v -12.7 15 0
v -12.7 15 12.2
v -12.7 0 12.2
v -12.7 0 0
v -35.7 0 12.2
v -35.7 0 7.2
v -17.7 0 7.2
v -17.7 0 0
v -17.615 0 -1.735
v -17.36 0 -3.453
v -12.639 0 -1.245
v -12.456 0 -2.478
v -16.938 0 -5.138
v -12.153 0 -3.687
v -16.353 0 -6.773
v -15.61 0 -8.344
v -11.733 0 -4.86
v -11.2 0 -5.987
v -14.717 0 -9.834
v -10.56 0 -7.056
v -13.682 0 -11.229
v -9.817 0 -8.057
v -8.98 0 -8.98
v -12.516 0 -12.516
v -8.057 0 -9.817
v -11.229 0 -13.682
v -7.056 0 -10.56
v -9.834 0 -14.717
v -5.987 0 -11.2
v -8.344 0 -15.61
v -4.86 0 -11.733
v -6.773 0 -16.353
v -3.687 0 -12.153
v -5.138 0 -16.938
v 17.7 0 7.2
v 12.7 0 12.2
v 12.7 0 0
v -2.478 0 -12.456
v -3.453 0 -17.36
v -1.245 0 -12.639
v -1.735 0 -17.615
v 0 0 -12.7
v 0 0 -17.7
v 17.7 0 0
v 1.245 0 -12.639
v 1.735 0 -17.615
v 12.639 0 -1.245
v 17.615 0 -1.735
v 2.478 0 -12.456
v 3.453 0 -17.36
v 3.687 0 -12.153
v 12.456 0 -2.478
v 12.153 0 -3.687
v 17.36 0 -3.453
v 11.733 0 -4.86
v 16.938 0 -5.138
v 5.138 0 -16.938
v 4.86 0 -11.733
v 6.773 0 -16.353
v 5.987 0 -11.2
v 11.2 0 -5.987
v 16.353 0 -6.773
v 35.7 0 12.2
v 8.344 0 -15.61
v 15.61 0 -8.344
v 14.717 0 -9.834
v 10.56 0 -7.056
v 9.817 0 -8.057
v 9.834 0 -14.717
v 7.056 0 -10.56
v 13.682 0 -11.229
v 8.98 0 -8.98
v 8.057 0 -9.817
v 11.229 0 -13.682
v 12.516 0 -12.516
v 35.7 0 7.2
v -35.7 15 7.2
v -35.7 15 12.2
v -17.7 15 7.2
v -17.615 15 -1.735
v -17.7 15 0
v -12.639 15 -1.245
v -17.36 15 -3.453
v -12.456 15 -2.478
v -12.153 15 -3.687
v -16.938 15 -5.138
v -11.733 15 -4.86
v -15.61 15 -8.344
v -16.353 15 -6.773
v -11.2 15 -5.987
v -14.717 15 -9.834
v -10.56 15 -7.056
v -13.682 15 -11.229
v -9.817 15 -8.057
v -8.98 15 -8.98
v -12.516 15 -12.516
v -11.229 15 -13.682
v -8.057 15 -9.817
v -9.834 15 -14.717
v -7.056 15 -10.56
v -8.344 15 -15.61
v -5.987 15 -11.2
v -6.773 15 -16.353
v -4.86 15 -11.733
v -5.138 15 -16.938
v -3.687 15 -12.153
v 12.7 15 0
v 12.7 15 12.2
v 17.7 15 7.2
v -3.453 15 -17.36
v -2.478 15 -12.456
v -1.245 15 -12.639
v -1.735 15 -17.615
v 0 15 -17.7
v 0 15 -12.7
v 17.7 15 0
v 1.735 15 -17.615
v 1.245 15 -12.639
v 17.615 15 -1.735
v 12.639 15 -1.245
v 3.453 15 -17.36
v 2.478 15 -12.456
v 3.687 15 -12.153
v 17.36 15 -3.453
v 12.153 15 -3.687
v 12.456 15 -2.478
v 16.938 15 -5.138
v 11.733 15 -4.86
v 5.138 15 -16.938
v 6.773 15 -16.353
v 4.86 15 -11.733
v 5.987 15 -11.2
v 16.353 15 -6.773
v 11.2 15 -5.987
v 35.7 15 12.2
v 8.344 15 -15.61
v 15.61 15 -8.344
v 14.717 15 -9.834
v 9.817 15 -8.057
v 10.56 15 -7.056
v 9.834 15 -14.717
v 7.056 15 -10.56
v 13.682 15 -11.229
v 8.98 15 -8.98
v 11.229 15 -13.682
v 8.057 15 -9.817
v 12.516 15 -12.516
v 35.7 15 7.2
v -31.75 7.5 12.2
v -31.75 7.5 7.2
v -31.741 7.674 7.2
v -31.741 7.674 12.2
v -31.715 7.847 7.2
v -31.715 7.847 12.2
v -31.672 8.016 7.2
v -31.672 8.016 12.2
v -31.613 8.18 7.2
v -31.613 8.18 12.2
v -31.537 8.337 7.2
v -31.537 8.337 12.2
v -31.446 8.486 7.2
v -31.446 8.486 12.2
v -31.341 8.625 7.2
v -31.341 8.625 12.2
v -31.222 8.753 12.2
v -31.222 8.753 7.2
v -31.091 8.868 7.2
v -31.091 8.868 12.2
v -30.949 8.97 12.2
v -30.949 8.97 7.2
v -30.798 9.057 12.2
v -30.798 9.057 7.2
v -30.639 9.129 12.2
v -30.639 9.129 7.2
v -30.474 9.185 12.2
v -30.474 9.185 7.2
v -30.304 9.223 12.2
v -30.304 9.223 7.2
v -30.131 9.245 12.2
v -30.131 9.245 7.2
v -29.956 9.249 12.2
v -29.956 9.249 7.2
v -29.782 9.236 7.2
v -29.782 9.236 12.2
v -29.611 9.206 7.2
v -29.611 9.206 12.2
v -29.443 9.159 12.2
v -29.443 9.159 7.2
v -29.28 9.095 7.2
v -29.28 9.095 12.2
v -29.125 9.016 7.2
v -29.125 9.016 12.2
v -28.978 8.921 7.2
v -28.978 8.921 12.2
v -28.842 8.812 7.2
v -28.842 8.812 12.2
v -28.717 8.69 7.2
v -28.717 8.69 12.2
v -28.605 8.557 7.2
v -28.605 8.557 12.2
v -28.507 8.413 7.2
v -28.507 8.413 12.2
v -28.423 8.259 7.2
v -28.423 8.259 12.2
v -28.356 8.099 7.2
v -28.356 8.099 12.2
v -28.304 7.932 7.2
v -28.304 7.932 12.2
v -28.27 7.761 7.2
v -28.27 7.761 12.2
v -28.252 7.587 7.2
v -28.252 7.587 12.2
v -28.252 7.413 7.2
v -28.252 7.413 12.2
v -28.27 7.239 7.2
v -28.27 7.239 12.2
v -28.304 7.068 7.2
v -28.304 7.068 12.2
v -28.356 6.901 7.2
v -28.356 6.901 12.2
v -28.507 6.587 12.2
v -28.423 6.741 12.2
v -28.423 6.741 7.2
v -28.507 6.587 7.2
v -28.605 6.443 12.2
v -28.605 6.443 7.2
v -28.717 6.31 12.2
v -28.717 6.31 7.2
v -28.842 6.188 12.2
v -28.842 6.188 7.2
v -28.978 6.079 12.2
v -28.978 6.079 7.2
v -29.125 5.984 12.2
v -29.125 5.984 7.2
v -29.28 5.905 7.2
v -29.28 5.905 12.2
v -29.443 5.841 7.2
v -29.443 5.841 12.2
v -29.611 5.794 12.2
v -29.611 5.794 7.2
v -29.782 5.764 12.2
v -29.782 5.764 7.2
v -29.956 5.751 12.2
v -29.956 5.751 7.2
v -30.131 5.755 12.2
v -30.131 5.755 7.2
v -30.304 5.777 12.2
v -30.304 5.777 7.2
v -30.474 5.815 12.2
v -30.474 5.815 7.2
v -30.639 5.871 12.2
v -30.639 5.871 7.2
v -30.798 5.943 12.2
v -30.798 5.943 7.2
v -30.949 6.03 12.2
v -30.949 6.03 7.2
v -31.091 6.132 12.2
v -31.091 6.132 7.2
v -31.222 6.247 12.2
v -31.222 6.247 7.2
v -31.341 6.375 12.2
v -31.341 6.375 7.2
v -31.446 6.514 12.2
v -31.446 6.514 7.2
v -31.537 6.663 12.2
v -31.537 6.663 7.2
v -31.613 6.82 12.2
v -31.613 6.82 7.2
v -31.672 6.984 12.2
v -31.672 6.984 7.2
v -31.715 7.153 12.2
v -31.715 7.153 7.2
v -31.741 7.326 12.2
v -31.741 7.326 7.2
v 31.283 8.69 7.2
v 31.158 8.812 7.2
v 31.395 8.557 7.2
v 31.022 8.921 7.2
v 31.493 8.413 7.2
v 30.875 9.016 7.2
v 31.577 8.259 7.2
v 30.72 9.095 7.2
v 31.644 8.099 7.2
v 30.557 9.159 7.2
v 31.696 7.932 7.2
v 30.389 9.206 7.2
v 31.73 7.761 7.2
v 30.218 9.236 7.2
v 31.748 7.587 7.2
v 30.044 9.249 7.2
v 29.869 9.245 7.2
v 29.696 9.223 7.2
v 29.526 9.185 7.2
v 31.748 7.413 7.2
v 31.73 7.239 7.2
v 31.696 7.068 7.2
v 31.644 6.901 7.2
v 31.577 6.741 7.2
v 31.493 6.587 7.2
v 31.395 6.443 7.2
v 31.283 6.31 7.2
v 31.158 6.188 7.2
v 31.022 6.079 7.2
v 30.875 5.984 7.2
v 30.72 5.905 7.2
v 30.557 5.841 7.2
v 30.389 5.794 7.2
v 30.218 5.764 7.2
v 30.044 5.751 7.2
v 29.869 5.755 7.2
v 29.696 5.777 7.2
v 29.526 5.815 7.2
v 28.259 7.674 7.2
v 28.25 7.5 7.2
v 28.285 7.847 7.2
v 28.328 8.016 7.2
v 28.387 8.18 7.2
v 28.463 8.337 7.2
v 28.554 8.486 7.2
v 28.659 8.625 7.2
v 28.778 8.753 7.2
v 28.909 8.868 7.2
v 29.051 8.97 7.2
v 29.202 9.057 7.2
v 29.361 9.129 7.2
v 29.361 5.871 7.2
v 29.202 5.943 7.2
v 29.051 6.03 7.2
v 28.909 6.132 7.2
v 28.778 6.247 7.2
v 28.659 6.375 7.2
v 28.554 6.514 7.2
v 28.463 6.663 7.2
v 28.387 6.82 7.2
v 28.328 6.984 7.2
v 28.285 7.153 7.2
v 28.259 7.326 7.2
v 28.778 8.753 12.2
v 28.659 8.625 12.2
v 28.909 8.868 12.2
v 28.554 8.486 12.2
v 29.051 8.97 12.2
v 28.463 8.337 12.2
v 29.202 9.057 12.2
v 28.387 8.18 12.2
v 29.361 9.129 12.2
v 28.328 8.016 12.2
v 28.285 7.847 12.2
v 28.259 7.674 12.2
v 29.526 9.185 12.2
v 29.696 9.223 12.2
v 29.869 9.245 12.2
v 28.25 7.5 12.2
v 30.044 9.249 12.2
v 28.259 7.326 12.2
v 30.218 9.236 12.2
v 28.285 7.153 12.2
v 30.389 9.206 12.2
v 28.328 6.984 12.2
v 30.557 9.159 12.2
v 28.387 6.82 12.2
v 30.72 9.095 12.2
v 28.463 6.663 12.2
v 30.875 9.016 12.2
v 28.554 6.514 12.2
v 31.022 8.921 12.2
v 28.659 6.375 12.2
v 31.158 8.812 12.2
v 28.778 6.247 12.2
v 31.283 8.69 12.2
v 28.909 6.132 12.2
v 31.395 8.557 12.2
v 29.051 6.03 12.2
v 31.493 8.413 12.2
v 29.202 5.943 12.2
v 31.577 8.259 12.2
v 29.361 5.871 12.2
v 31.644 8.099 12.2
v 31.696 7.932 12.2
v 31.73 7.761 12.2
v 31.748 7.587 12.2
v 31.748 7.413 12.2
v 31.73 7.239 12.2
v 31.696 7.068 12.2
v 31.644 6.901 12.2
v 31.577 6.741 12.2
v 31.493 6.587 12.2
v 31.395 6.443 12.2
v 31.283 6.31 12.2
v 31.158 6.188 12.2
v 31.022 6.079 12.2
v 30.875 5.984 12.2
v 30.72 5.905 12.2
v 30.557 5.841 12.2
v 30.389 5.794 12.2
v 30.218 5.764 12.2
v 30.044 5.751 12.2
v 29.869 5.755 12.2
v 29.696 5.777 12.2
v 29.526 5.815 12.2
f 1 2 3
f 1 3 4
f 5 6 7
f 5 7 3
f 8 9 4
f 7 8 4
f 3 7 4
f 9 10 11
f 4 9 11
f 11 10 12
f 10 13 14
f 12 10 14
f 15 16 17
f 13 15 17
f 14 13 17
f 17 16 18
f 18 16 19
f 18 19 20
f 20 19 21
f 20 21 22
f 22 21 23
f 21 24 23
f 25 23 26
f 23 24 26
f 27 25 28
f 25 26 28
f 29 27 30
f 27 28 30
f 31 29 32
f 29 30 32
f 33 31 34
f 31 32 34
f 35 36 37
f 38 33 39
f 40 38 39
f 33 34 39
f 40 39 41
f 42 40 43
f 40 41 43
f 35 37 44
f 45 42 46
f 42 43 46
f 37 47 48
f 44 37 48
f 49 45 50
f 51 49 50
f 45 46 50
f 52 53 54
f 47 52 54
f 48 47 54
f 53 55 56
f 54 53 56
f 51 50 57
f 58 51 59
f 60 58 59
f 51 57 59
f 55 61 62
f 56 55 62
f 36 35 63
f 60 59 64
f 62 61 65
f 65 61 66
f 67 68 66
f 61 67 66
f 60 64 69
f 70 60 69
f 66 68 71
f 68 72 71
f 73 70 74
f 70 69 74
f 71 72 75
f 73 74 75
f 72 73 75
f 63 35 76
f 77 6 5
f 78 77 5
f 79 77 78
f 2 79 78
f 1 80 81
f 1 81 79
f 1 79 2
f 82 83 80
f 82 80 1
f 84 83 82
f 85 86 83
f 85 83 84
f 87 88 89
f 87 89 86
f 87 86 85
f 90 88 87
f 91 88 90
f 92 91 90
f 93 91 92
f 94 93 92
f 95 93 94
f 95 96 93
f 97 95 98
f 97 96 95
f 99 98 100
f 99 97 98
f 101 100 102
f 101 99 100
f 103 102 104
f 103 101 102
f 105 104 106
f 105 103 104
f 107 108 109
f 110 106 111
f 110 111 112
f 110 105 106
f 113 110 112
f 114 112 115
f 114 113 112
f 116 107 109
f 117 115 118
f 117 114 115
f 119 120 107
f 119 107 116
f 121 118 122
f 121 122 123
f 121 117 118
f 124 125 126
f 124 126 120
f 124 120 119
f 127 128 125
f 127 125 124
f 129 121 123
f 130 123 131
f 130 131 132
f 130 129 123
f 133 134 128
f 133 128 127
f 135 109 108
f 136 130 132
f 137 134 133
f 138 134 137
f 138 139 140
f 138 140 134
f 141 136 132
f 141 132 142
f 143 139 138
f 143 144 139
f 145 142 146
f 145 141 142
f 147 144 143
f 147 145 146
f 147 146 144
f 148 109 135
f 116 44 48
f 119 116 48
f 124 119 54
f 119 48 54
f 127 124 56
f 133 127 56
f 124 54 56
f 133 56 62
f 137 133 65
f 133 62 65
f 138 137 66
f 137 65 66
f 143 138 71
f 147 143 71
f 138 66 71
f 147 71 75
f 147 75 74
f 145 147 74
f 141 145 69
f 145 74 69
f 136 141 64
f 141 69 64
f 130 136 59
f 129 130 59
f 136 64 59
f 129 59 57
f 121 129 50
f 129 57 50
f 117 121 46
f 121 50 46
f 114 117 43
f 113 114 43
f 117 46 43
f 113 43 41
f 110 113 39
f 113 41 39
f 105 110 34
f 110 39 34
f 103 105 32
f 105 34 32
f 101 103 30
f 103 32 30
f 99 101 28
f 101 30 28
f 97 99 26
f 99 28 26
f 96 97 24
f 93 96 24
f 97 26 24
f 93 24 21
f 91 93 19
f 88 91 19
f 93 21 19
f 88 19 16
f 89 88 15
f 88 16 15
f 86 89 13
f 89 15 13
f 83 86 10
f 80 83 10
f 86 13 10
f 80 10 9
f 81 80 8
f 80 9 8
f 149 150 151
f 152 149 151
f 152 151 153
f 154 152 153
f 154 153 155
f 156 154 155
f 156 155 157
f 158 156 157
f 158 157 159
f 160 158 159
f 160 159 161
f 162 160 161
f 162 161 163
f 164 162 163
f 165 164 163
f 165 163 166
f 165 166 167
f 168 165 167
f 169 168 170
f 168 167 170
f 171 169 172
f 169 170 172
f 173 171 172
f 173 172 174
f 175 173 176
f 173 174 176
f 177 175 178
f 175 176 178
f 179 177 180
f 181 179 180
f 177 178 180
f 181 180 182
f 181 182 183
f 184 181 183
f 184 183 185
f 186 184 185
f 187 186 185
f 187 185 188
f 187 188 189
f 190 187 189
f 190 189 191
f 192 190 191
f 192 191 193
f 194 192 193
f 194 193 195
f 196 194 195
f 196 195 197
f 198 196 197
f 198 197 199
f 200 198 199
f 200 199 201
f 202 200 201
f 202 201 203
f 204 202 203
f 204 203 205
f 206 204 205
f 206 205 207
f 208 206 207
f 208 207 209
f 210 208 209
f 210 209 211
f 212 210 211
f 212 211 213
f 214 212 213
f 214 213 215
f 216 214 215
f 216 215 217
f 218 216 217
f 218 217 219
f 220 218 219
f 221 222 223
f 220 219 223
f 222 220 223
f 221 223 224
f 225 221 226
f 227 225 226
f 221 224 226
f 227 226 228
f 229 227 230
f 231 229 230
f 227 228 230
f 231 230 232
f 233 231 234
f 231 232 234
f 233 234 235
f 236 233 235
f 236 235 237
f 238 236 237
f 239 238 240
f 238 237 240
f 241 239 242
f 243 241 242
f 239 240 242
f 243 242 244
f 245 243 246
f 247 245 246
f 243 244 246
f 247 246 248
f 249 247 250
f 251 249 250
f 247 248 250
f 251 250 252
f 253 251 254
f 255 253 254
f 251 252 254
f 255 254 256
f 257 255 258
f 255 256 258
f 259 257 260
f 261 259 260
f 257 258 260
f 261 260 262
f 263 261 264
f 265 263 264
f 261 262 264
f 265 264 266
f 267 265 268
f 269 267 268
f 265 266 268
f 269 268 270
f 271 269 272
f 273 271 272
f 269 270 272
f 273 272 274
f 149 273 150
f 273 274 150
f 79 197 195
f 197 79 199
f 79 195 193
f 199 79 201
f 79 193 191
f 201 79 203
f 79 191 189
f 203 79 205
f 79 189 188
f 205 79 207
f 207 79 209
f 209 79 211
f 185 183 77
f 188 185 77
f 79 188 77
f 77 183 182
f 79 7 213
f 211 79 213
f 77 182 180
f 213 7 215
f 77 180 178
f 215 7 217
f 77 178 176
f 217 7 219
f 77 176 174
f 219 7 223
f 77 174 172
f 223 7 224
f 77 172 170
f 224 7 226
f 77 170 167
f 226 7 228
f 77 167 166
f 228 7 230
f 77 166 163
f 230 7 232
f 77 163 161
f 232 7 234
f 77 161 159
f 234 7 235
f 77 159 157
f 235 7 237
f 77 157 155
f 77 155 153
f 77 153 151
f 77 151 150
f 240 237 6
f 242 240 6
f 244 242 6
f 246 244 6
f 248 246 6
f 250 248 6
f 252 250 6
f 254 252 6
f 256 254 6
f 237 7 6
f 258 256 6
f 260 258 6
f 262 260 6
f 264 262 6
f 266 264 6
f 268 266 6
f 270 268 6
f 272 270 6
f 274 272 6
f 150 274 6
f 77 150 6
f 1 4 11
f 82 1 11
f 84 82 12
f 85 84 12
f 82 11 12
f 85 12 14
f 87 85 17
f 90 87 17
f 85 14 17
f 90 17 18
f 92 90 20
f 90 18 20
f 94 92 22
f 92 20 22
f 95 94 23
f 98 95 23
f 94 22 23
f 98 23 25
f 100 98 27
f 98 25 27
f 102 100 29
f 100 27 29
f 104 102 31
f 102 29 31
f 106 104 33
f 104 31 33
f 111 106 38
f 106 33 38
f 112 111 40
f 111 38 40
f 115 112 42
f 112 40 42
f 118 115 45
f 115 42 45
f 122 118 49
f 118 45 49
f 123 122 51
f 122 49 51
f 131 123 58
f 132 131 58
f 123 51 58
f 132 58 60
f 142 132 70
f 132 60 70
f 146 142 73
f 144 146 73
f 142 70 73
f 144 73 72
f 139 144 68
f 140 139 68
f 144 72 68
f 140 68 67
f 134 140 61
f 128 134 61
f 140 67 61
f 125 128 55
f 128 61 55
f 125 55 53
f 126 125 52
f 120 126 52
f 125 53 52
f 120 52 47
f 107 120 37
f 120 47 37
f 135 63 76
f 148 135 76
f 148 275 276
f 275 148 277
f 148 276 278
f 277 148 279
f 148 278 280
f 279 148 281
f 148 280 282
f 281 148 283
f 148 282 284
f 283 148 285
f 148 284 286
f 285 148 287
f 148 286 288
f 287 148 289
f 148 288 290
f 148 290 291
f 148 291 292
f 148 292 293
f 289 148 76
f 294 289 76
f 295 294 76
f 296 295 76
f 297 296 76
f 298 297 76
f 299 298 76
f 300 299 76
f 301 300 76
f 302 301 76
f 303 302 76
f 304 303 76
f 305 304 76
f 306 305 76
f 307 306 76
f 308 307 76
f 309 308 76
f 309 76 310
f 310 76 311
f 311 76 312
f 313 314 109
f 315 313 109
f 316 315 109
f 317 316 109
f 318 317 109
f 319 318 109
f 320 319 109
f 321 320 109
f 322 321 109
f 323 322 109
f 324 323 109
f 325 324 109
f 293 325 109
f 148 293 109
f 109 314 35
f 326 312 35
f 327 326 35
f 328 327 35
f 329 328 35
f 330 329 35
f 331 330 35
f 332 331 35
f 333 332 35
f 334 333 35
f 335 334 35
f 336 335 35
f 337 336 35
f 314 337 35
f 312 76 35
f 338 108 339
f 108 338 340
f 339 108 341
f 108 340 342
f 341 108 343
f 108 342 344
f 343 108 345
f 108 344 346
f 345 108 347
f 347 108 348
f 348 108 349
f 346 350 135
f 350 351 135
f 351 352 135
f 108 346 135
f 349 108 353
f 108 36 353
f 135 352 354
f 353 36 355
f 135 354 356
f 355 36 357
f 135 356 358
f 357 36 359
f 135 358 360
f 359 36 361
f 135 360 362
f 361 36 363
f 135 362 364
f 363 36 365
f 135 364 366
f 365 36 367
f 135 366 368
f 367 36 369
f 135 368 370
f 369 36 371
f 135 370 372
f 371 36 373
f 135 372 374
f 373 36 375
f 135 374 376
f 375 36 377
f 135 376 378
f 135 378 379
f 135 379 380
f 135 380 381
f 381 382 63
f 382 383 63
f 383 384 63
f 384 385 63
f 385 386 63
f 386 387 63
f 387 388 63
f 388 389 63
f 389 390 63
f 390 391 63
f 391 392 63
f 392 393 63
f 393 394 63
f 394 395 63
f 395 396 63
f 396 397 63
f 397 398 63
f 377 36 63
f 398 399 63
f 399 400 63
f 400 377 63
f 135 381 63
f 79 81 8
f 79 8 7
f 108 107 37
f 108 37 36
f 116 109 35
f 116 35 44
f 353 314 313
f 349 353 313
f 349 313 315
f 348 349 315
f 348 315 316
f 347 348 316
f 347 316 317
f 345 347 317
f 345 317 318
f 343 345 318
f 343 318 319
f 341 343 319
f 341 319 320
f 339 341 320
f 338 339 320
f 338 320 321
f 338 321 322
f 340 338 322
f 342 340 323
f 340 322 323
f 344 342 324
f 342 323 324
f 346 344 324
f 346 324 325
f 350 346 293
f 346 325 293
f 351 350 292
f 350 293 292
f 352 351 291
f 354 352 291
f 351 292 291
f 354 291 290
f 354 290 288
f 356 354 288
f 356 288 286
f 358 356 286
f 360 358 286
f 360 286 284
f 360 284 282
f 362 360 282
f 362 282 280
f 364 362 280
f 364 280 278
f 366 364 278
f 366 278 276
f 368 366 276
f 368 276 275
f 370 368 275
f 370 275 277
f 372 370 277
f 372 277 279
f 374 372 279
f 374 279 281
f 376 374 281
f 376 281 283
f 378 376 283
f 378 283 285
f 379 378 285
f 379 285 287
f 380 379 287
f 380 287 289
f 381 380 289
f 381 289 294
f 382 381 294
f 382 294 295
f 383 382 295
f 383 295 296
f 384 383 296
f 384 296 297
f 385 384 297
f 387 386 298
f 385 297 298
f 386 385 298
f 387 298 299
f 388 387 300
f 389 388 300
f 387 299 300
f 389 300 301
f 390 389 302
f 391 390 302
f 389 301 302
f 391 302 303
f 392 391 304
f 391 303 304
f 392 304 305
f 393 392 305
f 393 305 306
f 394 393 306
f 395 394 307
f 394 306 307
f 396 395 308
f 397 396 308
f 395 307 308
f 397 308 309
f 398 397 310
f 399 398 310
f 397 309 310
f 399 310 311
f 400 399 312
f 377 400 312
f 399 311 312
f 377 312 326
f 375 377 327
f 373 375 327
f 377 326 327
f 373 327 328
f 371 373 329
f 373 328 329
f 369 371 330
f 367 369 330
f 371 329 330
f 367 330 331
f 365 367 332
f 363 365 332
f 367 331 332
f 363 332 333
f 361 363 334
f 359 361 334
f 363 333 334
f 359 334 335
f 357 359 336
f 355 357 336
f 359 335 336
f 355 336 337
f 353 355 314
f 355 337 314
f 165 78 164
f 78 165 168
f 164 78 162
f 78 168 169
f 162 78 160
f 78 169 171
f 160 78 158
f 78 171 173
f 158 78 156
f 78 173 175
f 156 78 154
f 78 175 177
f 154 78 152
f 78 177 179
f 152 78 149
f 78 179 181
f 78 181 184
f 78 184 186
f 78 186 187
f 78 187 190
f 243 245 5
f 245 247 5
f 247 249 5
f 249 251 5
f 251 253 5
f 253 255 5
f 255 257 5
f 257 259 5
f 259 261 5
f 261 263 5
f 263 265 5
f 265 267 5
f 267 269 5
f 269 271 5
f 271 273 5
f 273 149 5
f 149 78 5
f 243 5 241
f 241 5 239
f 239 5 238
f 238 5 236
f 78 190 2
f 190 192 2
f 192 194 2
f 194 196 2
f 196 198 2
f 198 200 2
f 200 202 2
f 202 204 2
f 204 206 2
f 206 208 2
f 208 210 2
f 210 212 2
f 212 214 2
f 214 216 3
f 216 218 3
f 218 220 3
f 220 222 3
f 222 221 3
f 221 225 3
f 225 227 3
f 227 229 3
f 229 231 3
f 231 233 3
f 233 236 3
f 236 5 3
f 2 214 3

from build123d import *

# Parameters (mm, degrees)
BOSS_EXTRUDE1_DEPTH = 15
SKETCH2_R           = 1.75
CUT_EXTRUDE1_DEPTH  = 6


with BuildPart() as part:
    # Sketch1 → Boss-Extrude1 (new body)
    with BuildSketch(Plane(origin=(0, 0, 0), x_dir=(1, 0, 0), z_dir=(0, 1, 0))):
        with BuildLine():
            Line((-35.7, -7.2), (-35.7, -12.2))
            Line((-35.7, -12.2), (-12.7, -12.2))
            Line((-12.7, -12.2), (-12.7, 0))
            ThreePointArc((-12.7, 0), (0, 12.7), (12.7, 0))
            Line((12.7, 0), (12.7, -12.2))
            Line((12.7, -12.2), (35.7, -12.2))
            Line((35.7, -12.2), (35.7, -7.2))
            Line((35.7, -7.2), (17.7, -7.2))
            Line((17.7, -7.2), (17.7, 0))
            ThreePointArc((17.7, 0), (0, 17.7), (-17.7, 0))
            Line((-17.7, 0), (-17.7, -7.2))
            Line((-17.7, -7.2), (-35.7, -7.2))
        make_face()
    extrude(amount=BOSS_EXTRUDE1_DEPTH)

    # Sketch2 → Cut-Extrude1 (cut, through all)
    with BuildSketch(Plane(origin=(0, 0, 7.2), x_dir=(-1, 0, 0), z_dir=(0, 0, -1))):
        with Locations((-30, 7.5)):
            Circle(SKETCH2_R)
        with Locations((30, 7.5)):
            Circle(SKETCH2_R)
    extrude(amount=-CUT_EXTRUDE1_DEPTH, mode=Mode.SUBTRACT)


solid = part.part
